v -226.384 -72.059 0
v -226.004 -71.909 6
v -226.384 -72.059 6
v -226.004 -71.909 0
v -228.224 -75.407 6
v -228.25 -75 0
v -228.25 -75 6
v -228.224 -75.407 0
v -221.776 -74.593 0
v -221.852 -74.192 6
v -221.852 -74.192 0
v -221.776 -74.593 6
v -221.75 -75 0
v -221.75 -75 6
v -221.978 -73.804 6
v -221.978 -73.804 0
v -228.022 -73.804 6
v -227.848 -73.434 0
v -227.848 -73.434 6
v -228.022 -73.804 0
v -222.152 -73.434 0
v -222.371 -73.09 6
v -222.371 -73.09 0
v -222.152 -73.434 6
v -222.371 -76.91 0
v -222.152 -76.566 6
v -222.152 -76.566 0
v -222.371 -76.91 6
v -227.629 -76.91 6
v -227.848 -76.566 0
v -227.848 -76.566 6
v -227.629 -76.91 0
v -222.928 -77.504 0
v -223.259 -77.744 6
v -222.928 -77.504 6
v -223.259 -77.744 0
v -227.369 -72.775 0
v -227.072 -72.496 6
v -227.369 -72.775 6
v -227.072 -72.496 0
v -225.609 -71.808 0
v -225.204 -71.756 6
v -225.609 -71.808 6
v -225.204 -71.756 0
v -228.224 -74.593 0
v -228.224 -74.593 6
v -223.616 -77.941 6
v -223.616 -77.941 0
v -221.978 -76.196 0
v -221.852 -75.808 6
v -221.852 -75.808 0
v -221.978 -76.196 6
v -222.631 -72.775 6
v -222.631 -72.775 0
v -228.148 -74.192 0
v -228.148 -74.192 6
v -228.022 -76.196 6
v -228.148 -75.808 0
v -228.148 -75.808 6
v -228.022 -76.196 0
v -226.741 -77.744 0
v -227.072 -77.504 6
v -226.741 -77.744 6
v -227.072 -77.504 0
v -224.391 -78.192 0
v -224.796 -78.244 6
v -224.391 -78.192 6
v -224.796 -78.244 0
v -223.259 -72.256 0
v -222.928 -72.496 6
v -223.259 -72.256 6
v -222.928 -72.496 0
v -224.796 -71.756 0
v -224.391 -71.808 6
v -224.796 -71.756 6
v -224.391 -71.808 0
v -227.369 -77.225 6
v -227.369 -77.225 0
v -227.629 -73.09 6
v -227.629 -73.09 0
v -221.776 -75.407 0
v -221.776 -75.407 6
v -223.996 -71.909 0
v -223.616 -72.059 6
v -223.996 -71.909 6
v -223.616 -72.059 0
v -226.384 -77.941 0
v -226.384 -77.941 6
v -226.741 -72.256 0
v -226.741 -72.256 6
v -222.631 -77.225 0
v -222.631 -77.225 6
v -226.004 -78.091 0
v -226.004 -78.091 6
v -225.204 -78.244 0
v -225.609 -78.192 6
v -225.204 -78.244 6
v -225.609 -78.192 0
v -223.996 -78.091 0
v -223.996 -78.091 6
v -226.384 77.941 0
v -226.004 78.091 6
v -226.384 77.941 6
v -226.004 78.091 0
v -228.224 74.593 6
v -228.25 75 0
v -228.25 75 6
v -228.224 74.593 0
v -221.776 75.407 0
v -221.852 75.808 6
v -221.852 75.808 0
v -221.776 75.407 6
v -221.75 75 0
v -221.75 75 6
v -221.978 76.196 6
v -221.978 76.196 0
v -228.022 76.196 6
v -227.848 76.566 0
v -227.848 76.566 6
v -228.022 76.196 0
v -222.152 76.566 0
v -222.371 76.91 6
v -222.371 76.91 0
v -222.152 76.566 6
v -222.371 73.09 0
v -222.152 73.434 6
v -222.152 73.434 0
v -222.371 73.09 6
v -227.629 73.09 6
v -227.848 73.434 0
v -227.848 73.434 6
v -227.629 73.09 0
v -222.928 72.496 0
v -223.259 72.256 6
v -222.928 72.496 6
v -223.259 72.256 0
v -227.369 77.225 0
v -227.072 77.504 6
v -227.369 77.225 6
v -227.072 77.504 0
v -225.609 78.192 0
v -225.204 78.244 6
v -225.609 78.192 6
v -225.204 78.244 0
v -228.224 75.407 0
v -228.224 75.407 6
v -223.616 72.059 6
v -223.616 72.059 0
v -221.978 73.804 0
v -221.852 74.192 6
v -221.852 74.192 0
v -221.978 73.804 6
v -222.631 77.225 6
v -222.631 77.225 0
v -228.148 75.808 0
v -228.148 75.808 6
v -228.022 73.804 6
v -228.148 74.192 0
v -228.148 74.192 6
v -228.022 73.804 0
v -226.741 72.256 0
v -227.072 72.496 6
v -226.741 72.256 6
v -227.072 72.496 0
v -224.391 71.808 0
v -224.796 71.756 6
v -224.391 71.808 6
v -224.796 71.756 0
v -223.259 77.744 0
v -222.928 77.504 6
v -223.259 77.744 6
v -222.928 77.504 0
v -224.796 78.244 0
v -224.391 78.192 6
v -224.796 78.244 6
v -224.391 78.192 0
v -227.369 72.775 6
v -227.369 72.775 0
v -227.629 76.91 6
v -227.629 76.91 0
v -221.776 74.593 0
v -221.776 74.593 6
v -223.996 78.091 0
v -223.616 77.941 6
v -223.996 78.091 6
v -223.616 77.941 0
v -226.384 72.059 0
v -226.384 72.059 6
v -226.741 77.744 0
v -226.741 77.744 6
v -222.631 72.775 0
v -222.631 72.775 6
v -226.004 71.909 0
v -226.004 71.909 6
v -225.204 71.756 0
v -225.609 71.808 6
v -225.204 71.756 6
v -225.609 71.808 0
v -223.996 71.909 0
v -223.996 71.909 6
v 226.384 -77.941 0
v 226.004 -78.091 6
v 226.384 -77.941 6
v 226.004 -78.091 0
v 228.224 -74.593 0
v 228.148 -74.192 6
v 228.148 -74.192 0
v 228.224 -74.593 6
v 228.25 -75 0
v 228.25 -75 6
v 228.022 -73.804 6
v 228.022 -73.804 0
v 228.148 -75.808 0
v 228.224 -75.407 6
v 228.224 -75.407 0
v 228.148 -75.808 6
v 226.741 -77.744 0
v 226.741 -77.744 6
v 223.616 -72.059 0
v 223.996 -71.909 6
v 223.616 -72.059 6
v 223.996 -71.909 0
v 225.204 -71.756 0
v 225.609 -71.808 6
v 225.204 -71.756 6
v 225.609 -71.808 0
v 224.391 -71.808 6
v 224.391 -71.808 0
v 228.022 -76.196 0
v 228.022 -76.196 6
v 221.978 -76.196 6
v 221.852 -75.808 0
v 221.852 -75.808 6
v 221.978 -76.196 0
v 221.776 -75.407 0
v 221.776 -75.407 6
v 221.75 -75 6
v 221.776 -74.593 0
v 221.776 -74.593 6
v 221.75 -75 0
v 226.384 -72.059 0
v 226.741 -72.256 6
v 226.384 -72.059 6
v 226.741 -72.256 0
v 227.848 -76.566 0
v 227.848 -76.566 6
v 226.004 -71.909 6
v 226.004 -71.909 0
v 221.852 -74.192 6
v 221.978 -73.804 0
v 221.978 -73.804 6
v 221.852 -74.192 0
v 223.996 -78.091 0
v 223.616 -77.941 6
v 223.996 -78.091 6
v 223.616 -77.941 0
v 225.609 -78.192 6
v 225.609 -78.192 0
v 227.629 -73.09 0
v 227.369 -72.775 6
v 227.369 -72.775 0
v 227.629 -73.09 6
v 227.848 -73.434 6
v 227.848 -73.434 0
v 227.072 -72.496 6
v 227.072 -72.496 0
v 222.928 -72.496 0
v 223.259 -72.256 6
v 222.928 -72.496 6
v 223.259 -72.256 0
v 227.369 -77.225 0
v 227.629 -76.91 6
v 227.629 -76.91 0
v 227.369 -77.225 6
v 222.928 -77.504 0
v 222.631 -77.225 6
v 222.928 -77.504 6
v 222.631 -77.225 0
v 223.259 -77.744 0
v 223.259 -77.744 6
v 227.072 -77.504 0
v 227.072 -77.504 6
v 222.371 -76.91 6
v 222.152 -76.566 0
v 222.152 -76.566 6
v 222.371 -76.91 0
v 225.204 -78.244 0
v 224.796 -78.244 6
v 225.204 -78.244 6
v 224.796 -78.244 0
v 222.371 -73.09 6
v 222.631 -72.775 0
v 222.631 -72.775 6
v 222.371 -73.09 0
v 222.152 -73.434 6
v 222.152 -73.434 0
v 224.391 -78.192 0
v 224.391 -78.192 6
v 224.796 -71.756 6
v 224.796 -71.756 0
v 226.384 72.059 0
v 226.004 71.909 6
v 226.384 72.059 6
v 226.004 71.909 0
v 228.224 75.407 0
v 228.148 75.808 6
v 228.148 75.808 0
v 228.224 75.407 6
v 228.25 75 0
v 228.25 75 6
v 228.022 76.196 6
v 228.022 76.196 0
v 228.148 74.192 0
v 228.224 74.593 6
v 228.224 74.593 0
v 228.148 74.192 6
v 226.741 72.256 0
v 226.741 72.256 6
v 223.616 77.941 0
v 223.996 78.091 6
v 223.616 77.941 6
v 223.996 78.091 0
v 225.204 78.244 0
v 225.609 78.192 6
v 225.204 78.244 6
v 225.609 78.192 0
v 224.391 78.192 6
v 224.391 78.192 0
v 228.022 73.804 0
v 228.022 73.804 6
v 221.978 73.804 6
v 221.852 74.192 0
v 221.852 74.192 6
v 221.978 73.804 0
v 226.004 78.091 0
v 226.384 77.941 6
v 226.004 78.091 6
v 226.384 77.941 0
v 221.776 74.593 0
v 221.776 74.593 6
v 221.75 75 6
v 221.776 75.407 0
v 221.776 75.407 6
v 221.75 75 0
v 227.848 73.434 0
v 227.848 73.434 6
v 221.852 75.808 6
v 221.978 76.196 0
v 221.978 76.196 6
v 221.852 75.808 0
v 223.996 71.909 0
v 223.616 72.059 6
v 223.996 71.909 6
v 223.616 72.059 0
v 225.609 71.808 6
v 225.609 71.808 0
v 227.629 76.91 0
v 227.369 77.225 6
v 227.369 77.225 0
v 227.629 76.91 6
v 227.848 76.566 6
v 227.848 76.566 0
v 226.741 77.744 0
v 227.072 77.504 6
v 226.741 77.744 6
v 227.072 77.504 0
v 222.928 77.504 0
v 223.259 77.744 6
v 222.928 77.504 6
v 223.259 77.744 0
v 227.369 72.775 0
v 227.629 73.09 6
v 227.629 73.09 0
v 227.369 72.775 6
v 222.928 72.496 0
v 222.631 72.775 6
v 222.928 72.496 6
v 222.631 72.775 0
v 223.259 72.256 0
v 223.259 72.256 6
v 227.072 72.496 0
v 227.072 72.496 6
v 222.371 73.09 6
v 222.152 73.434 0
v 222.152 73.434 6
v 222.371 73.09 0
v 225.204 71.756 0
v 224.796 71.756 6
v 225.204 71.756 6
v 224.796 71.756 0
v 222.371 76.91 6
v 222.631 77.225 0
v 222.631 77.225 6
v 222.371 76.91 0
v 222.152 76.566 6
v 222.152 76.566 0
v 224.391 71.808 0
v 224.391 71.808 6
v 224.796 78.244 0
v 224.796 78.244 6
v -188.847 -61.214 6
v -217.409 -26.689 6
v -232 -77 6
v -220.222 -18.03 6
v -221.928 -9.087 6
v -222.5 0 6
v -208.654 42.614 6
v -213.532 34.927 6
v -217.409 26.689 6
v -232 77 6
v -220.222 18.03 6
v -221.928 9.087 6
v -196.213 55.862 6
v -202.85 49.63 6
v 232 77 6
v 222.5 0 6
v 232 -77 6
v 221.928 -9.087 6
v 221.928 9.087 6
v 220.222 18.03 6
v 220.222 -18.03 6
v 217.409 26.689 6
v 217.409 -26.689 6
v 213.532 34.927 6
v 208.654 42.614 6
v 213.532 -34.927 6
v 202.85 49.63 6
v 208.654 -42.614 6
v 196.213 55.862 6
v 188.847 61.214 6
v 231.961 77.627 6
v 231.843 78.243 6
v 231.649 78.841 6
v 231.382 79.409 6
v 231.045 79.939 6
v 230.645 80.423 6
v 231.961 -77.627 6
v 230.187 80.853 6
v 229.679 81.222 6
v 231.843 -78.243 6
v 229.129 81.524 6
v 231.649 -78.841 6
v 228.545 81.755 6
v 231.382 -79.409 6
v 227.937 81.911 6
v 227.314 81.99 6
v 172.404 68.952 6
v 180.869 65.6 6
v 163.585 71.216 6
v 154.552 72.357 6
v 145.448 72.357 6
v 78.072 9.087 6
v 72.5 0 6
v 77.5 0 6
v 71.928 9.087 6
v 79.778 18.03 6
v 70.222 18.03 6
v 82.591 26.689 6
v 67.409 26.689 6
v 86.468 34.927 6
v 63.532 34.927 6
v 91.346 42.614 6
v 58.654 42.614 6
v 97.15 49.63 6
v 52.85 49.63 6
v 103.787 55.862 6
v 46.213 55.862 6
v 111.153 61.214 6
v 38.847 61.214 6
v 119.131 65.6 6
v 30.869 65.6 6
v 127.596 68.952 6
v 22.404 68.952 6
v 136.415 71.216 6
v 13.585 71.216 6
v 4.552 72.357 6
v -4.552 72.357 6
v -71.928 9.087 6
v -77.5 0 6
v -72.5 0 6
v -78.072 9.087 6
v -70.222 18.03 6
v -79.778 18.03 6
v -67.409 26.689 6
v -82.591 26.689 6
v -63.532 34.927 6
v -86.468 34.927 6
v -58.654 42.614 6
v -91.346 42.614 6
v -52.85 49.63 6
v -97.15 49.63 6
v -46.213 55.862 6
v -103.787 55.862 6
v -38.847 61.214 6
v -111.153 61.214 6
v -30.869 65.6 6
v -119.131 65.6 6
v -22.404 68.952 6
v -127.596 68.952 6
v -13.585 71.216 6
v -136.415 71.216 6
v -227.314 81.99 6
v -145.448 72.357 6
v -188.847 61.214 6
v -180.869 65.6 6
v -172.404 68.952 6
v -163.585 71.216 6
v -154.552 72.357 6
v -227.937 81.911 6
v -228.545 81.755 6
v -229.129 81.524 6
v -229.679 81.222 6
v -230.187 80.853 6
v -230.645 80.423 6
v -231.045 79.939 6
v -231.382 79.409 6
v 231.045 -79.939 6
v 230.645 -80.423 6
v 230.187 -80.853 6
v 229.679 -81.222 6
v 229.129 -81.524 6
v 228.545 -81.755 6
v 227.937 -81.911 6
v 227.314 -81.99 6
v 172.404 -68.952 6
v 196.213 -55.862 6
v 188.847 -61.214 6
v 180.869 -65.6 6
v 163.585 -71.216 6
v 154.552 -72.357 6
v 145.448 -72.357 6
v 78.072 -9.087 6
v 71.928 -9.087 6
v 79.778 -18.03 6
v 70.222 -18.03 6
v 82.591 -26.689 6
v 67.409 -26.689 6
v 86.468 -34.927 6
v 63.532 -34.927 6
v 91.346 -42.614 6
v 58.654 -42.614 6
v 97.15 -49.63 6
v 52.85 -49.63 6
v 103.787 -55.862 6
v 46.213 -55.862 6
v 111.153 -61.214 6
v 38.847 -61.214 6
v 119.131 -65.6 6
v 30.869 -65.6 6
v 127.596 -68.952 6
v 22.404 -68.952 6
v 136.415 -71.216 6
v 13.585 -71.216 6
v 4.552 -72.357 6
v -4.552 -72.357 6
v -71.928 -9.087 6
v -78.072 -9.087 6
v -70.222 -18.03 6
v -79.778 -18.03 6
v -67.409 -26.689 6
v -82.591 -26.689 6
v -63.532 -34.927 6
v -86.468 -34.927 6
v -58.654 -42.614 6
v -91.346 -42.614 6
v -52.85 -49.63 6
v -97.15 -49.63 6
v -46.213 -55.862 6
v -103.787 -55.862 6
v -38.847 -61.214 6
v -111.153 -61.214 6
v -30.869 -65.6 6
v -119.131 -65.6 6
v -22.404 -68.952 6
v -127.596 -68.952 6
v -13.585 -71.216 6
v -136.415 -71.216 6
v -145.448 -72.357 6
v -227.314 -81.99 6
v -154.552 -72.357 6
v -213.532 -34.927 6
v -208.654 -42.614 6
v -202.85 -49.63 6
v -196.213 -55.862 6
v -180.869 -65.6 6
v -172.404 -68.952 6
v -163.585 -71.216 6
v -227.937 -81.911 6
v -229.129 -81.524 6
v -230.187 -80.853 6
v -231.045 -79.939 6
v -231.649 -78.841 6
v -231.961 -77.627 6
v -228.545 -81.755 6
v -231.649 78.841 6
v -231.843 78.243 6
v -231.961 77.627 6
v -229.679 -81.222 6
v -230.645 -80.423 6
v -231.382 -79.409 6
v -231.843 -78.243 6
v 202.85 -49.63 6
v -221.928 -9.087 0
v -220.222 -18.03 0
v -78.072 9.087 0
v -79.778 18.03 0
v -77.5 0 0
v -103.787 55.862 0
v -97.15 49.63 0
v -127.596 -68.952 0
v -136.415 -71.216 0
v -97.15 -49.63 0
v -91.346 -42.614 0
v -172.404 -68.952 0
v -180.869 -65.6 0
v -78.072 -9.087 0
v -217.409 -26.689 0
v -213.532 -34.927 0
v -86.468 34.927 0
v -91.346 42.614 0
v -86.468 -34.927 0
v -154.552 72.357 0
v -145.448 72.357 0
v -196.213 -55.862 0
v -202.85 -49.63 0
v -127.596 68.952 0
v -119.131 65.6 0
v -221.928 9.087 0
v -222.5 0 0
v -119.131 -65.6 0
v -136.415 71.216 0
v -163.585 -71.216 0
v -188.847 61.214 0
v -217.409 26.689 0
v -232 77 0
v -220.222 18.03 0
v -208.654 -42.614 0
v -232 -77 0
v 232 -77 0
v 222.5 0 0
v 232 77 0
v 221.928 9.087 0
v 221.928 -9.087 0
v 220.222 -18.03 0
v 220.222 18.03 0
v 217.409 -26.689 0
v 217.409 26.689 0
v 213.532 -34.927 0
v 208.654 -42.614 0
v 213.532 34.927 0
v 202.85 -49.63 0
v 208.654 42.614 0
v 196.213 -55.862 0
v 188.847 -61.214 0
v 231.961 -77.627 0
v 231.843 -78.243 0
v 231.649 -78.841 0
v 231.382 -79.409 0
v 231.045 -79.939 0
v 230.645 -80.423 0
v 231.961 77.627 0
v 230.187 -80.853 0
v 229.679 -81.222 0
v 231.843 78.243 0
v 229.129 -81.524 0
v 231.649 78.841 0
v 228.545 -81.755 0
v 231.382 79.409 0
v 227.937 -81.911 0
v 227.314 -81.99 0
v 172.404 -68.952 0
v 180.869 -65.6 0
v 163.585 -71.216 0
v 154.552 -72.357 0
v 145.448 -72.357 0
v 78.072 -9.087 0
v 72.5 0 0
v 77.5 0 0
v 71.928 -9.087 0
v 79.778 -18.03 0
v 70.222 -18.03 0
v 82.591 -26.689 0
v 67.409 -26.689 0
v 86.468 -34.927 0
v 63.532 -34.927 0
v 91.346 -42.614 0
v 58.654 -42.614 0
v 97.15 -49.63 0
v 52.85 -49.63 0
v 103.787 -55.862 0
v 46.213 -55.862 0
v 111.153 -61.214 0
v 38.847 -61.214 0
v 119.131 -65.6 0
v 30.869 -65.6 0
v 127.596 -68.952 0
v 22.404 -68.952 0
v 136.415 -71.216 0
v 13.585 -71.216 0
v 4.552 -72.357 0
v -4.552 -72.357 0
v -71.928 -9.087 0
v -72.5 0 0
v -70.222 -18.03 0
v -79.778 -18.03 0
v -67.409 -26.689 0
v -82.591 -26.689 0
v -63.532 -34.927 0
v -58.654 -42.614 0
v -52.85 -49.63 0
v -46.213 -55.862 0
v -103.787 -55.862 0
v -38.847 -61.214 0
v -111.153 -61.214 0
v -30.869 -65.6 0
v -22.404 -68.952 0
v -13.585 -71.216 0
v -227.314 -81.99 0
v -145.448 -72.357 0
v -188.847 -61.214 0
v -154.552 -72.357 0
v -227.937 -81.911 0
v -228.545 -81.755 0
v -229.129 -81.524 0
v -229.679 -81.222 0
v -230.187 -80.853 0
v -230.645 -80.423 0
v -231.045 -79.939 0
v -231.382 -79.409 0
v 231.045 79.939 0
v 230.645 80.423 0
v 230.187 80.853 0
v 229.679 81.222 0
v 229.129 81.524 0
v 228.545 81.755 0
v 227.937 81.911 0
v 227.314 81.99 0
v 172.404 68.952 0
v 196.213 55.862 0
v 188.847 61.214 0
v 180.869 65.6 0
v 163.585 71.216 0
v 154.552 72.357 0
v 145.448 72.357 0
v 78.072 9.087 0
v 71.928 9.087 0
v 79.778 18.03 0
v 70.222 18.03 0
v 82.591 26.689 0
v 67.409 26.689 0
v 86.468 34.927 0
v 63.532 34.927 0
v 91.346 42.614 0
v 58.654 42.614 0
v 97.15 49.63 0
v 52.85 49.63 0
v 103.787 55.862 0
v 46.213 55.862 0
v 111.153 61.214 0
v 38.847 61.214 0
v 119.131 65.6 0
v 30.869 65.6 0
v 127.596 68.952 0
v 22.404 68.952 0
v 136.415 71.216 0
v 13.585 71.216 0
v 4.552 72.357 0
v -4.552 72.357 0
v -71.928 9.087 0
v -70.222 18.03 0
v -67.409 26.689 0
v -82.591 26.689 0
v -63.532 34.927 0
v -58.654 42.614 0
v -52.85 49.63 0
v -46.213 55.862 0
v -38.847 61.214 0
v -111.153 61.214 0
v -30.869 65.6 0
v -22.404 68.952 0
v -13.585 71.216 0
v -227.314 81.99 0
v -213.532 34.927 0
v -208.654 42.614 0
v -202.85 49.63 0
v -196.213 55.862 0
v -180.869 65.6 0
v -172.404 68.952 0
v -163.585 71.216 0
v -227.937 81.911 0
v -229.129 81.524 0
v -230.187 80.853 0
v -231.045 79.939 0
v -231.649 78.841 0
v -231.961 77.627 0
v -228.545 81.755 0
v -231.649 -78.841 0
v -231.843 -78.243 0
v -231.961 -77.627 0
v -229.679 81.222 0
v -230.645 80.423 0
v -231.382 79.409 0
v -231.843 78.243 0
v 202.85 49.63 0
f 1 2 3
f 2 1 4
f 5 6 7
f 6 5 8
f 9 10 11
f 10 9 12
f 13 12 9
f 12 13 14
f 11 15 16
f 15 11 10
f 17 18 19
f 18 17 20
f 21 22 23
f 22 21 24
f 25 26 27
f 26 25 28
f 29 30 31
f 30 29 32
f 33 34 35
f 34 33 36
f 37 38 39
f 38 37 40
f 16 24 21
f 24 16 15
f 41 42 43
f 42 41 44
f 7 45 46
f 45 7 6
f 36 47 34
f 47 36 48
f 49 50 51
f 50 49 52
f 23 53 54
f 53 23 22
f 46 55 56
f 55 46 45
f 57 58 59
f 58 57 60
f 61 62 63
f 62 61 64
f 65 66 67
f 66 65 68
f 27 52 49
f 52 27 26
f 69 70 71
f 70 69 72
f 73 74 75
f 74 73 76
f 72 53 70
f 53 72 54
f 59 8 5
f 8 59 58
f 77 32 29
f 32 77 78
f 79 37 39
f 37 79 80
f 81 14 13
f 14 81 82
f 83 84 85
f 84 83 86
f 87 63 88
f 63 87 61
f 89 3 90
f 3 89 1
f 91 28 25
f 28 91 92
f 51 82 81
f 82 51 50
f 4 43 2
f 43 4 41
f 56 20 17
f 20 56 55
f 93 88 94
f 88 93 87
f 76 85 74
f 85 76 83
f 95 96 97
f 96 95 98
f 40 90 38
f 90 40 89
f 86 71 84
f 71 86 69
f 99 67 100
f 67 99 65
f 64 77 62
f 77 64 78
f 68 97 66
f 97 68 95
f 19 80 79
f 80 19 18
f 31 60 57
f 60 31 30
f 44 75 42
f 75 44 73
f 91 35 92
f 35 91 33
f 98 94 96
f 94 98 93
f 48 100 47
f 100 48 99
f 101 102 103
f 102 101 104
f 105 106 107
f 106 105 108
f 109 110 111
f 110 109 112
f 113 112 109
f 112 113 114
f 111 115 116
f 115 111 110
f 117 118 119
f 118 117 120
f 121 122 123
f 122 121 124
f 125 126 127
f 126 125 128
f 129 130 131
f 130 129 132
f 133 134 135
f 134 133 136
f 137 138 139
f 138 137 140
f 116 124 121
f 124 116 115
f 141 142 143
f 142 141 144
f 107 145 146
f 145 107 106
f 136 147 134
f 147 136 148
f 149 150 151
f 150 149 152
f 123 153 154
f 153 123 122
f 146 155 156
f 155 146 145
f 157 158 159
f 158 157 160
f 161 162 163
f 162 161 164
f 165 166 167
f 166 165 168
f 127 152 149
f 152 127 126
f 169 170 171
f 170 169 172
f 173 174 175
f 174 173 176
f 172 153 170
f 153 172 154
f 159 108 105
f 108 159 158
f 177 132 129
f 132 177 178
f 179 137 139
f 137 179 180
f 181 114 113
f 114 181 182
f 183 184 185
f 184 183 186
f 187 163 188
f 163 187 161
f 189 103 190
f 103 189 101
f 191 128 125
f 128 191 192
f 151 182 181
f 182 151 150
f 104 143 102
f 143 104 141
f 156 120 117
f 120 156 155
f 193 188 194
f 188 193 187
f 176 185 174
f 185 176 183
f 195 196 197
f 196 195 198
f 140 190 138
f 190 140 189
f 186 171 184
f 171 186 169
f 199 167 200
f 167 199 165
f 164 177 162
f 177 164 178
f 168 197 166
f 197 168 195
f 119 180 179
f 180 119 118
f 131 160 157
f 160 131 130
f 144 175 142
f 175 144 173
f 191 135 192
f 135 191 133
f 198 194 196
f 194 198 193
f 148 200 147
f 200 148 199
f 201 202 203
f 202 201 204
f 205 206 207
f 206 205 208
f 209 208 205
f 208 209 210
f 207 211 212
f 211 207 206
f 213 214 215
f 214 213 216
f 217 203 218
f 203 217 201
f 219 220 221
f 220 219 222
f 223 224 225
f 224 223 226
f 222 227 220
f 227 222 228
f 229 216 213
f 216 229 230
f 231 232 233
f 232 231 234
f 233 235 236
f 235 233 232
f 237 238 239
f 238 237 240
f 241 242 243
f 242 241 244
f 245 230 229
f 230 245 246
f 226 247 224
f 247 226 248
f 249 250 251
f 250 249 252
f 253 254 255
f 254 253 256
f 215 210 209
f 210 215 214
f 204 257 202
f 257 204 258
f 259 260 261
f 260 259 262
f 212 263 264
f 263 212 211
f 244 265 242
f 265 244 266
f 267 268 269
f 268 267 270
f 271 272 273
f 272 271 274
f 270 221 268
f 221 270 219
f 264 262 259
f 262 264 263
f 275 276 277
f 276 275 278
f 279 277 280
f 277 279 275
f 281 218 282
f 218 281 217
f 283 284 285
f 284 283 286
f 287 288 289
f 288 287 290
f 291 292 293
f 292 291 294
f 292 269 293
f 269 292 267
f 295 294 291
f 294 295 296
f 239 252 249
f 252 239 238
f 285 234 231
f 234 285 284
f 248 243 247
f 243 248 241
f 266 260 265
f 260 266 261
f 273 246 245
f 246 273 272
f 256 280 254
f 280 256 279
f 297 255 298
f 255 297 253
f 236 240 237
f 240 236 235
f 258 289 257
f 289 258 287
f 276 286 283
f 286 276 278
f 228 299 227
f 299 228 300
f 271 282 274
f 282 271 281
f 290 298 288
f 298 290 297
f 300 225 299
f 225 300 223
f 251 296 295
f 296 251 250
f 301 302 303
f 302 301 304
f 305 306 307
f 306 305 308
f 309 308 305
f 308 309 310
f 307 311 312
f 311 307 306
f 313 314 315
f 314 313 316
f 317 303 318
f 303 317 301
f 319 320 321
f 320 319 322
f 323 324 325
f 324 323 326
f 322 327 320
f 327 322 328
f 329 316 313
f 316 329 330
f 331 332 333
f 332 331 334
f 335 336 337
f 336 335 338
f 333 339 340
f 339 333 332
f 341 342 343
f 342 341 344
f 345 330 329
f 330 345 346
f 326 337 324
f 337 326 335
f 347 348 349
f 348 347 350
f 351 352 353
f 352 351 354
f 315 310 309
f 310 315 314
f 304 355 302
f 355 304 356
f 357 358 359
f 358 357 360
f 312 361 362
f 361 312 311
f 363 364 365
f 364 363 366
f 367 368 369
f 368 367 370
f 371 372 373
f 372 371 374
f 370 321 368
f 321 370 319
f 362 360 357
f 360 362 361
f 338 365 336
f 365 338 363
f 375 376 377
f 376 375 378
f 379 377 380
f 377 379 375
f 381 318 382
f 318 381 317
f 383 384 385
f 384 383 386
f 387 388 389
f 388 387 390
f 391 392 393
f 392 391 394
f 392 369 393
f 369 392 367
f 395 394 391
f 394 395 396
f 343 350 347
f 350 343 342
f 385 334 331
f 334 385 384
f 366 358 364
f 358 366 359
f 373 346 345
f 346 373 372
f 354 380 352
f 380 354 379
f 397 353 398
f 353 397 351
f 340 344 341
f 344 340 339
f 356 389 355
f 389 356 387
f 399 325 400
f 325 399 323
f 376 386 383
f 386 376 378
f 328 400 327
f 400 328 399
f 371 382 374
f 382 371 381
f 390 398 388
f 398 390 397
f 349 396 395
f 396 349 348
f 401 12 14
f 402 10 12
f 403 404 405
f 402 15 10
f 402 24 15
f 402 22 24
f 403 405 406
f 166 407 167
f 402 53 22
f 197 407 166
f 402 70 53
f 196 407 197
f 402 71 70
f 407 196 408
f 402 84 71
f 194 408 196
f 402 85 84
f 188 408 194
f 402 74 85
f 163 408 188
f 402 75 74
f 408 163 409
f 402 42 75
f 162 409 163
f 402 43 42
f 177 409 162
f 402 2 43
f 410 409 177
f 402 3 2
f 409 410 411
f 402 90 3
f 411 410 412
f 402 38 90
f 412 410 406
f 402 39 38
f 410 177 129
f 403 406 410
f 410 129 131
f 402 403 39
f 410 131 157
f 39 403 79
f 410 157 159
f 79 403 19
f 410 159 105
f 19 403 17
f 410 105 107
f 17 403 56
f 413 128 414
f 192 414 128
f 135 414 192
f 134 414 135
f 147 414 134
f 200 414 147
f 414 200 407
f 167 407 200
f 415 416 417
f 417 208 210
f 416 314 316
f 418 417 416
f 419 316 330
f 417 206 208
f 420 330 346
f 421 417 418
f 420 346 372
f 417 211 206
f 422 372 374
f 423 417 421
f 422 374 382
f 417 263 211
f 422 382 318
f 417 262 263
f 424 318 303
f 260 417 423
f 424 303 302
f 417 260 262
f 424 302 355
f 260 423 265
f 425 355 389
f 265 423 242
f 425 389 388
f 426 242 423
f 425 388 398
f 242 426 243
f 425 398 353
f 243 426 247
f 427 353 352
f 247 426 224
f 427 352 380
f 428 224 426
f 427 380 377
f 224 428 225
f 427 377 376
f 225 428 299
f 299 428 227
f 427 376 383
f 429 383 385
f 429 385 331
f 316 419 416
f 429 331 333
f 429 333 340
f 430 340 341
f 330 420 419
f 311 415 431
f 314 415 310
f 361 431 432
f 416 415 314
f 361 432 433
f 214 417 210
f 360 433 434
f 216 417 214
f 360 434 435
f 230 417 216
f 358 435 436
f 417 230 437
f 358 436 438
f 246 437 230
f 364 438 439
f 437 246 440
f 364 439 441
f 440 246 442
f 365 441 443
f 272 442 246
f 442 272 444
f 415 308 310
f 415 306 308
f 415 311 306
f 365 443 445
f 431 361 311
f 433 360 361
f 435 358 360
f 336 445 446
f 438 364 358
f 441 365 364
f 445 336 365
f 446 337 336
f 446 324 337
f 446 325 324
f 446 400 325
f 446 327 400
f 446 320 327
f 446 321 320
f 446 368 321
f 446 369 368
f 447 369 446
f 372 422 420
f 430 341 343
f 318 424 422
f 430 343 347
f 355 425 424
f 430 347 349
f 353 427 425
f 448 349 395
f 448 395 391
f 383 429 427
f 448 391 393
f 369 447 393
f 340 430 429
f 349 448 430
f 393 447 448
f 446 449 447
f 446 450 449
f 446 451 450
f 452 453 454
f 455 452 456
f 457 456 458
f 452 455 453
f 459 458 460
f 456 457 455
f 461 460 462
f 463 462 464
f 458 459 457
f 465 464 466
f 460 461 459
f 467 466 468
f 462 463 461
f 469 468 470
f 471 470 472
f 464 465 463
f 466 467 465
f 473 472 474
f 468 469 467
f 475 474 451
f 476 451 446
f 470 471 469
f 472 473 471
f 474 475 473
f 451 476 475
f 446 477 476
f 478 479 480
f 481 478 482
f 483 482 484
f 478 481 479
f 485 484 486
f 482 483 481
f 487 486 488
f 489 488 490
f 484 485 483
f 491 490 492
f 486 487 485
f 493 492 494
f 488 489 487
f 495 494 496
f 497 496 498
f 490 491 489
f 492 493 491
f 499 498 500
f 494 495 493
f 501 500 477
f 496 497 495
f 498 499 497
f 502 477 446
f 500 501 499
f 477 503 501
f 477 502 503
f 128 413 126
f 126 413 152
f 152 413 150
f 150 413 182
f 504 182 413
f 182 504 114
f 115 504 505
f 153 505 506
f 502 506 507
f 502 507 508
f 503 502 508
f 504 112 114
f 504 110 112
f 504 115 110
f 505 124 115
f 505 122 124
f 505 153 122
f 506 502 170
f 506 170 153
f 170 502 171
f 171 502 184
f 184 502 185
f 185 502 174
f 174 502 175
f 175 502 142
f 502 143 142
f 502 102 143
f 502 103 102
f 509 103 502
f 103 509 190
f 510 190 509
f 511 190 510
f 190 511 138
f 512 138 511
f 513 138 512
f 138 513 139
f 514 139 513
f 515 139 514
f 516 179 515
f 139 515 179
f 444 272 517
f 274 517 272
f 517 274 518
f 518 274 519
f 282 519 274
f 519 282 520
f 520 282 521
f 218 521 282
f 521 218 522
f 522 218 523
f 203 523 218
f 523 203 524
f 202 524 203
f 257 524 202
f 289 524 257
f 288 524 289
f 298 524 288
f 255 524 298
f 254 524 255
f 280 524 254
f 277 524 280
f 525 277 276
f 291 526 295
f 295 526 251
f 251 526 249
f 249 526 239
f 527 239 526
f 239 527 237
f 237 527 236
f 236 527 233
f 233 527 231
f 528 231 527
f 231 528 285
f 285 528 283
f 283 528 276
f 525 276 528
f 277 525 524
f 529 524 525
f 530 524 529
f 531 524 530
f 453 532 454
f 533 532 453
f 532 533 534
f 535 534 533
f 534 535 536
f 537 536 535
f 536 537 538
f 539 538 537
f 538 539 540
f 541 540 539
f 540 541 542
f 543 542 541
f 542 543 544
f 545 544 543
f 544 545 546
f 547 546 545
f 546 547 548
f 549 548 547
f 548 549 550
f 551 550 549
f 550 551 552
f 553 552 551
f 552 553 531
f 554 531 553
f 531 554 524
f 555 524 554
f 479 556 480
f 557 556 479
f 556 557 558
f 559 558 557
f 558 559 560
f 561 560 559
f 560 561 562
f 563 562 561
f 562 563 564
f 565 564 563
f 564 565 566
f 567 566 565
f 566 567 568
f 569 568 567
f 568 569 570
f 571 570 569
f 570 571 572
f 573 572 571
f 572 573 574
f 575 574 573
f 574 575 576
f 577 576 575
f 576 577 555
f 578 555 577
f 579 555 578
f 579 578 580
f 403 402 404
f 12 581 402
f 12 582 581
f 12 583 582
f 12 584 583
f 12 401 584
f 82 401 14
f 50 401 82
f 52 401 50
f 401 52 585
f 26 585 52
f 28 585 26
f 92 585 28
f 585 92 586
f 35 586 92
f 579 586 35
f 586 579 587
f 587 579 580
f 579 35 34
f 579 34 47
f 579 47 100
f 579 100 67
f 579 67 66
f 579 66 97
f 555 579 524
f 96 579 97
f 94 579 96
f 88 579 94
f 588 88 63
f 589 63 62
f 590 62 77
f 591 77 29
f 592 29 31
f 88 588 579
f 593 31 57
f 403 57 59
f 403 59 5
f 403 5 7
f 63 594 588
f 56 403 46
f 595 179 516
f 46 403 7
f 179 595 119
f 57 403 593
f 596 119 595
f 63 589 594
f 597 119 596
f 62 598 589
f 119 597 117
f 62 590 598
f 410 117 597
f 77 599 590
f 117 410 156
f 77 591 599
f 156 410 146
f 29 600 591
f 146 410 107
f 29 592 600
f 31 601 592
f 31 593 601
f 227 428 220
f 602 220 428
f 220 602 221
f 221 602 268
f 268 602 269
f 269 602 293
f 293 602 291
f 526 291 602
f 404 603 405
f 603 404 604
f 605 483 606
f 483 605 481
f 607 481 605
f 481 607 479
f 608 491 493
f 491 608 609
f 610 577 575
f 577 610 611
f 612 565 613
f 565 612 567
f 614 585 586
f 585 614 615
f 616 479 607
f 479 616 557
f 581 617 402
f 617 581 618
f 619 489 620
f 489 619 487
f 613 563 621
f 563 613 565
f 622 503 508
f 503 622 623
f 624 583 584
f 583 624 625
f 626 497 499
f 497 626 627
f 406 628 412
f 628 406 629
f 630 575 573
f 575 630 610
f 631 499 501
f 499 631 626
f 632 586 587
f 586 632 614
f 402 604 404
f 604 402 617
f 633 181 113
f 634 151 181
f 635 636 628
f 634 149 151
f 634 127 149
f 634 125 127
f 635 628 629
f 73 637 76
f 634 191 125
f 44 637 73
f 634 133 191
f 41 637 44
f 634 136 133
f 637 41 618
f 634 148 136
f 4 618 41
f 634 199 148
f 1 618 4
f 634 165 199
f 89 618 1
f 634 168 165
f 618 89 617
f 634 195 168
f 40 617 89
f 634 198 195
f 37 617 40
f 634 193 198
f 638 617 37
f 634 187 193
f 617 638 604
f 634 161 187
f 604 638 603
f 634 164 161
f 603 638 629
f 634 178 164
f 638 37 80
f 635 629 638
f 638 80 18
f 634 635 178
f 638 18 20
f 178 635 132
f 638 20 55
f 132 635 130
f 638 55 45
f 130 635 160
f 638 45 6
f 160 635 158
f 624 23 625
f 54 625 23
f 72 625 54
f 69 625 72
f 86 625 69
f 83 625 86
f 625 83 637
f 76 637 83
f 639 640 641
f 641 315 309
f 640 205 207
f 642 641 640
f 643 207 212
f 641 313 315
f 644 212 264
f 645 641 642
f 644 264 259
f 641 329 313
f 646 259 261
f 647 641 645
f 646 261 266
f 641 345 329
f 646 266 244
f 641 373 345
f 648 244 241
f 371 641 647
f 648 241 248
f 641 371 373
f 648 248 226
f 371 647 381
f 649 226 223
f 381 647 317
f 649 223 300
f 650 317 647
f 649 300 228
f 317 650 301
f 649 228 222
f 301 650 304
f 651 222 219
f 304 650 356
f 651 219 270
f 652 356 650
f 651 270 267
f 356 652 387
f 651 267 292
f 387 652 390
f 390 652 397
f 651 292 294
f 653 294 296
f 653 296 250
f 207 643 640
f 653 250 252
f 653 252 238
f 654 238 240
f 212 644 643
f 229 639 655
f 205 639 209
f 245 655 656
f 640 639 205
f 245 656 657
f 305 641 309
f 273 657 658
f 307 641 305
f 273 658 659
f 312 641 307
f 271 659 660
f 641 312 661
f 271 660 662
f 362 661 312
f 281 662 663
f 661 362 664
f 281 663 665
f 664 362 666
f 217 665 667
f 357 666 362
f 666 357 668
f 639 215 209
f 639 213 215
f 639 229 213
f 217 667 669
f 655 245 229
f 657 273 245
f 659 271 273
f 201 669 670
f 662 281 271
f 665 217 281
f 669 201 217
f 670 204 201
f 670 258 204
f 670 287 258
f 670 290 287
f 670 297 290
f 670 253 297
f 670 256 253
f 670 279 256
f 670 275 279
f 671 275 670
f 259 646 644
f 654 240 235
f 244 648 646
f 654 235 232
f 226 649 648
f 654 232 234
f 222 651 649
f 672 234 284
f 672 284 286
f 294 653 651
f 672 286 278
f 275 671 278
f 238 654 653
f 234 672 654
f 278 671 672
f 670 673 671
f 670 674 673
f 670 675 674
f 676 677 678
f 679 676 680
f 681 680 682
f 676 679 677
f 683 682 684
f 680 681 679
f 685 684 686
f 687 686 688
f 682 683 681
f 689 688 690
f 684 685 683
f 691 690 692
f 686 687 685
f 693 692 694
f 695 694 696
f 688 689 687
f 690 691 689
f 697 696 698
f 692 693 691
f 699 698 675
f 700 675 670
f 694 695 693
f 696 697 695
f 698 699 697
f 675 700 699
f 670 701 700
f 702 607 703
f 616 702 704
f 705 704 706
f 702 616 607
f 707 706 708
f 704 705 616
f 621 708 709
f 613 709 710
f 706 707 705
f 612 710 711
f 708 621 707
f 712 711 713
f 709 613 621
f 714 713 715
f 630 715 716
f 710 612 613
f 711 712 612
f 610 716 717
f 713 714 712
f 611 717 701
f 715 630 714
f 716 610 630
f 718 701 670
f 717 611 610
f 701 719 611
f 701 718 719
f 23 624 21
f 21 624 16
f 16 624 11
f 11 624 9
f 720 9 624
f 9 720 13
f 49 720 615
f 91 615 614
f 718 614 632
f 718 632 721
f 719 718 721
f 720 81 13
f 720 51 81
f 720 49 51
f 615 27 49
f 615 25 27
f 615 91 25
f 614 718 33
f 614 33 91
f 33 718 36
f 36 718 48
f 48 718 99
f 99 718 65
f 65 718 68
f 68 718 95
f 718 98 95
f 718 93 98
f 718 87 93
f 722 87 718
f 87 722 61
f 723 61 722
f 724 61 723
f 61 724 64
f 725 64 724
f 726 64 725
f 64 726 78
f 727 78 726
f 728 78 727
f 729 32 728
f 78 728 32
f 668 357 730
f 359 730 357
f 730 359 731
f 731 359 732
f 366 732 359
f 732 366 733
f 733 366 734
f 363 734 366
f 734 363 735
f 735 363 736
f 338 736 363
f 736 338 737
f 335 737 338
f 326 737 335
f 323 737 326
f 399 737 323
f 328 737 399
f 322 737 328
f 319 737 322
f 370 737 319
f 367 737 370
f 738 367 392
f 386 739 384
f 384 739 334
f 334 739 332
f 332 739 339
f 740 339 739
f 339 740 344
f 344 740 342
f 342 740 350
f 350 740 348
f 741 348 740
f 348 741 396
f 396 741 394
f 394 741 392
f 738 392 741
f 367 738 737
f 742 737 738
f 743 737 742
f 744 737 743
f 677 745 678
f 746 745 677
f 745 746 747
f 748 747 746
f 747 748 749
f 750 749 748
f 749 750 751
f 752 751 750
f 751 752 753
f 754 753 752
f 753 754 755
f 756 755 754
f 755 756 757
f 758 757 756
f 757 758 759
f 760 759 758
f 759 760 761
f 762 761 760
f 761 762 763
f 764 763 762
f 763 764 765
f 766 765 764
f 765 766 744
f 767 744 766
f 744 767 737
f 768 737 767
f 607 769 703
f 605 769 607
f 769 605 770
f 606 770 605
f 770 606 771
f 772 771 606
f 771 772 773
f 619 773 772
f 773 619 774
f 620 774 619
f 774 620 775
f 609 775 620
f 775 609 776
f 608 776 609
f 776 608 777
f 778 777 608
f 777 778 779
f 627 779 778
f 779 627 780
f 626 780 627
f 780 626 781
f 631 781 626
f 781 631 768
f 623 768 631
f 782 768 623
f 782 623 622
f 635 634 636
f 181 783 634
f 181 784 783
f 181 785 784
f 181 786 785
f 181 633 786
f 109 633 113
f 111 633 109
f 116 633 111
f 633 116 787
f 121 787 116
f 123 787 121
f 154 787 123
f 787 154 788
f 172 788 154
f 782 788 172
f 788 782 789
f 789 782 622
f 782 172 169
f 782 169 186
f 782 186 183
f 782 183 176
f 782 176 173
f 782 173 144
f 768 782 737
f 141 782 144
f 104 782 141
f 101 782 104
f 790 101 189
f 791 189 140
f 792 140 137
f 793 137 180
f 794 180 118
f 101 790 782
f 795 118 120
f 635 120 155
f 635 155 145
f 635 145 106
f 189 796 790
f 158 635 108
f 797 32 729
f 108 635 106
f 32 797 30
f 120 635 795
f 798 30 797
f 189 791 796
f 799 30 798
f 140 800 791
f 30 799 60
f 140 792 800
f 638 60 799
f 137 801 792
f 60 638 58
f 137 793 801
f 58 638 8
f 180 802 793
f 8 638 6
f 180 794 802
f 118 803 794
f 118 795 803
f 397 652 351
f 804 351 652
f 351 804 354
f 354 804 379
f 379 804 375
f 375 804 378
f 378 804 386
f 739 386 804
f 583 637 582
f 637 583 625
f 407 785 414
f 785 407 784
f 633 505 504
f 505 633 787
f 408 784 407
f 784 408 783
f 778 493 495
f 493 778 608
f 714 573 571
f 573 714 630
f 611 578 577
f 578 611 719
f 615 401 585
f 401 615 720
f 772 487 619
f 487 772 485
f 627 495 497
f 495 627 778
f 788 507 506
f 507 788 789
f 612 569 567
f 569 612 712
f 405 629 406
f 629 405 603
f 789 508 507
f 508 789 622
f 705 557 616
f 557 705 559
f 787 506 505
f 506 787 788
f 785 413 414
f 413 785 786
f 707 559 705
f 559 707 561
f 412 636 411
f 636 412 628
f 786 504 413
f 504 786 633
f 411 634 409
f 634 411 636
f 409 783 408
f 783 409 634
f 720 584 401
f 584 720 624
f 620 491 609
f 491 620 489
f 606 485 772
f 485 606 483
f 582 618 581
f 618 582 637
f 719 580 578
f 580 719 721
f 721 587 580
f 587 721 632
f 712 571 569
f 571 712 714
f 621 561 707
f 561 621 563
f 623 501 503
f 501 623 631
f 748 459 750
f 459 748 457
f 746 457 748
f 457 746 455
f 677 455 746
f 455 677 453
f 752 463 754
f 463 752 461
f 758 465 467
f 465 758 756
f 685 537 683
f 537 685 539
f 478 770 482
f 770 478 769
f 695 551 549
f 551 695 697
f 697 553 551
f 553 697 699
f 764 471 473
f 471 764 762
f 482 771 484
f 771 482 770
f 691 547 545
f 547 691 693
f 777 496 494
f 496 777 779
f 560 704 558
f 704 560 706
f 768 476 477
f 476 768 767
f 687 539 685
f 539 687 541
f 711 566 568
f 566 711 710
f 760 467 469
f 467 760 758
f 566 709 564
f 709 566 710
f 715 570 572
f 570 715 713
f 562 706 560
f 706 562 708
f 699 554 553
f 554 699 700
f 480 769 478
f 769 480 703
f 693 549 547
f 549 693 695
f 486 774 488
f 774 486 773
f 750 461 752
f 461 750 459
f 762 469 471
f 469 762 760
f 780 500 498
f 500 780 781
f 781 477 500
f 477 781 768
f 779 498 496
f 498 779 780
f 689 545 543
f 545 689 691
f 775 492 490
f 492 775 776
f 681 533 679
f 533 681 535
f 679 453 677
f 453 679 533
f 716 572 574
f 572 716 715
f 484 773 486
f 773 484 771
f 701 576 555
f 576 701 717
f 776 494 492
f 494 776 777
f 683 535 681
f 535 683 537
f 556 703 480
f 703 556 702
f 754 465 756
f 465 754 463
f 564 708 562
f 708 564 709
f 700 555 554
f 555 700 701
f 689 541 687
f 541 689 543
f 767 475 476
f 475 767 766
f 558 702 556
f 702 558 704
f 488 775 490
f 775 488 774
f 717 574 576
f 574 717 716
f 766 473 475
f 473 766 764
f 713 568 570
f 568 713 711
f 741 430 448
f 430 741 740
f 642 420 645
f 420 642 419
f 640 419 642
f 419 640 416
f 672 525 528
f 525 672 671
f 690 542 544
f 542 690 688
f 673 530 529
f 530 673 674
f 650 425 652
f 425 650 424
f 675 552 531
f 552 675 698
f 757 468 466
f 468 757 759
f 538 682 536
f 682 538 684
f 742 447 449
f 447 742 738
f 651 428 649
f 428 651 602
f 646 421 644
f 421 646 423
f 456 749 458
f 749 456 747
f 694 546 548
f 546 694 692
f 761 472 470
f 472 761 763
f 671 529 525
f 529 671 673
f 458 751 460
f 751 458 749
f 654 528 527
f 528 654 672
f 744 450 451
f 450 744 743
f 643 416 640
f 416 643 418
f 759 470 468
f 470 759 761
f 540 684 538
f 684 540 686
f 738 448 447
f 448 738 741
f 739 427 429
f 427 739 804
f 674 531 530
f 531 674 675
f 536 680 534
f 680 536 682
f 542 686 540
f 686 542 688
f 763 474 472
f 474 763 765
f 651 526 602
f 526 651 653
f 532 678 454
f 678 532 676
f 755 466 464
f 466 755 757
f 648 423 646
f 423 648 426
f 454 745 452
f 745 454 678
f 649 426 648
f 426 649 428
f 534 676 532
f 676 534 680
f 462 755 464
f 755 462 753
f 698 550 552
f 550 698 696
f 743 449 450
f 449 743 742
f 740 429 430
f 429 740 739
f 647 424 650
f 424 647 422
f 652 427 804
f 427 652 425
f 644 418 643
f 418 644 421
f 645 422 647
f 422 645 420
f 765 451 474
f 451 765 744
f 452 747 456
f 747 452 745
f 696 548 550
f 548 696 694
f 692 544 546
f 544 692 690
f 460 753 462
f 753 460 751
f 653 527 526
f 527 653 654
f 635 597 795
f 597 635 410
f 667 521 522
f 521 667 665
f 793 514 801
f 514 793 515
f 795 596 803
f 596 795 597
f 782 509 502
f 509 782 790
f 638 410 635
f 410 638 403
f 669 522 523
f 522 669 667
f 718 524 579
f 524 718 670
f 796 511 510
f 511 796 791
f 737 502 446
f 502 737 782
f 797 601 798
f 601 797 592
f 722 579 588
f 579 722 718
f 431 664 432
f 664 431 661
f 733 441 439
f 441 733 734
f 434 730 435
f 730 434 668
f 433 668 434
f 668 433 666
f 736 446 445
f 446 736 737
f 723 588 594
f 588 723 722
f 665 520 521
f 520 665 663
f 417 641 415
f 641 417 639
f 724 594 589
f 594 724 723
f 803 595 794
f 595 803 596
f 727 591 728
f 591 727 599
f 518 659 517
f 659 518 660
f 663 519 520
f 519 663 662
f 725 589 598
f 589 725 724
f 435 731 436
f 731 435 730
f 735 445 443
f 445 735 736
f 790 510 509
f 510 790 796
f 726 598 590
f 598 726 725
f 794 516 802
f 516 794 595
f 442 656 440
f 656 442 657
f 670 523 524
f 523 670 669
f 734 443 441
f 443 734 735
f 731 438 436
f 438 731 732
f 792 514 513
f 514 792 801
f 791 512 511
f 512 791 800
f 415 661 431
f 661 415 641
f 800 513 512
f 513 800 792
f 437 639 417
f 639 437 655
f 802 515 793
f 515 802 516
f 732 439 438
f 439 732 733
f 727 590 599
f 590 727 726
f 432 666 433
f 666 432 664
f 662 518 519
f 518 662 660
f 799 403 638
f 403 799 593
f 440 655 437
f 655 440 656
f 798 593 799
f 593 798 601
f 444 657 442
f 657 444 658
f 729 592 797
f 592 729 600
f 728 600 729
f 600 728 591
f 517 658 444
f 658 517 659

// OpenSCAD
$fn = 50;


difference() {
	union() {
		hull() {
			translate(v = [-227.0000000000, 77.0000000000, 0]) {
				cylinder(h = 6, r = 5);
			}
			translate(v = [227.0000000000, 77.0000000000, 0]) {
				cylinder(h = 6, r = 5);
			}
			translate(v = [-227.0000000000, -77.0000000000, 0]) {
				cylinder(h = 6, r = 5);
			}
			translate(v = [227.0000000000, -77.0000000000, 0]) {
				cylinder(h = 6, r = 5);
			}
		}
	}
	union() {
		#translate(v = [-225.0000000000, -75.0000000000, -100.0000000000]) {
			cylinder(h = 200, r = 3.2500000000);
		}
		#translate(v = [-225.0000000000, 75.0000000000, -100.0000000000]) {
			cylinder(h = 200, r = 3.2500000000);
		}
		#translate(v = [225.0000000000, -75.0000000000, -100.0000000000]) {
			cylinder(h = 200, r = 3.2500000000);
		}
		#translate(v = [225.0000000000, 75.0000000000, -100.0000000000]) {
			cylinder(h = 200, r = 3.2500000000);
		}
		#translate(v = [-150.0000000000, 0, 0]) {
			cylinder(h = 6, r = 72.5000000000);
		}
		#cylinder(h = 6, r = 72.5000000000);
		#translate(v = [150.0000000000, 0, 0]) {
			cylinder(h = 6, r = 72.5000000000);
		}
	}
}
